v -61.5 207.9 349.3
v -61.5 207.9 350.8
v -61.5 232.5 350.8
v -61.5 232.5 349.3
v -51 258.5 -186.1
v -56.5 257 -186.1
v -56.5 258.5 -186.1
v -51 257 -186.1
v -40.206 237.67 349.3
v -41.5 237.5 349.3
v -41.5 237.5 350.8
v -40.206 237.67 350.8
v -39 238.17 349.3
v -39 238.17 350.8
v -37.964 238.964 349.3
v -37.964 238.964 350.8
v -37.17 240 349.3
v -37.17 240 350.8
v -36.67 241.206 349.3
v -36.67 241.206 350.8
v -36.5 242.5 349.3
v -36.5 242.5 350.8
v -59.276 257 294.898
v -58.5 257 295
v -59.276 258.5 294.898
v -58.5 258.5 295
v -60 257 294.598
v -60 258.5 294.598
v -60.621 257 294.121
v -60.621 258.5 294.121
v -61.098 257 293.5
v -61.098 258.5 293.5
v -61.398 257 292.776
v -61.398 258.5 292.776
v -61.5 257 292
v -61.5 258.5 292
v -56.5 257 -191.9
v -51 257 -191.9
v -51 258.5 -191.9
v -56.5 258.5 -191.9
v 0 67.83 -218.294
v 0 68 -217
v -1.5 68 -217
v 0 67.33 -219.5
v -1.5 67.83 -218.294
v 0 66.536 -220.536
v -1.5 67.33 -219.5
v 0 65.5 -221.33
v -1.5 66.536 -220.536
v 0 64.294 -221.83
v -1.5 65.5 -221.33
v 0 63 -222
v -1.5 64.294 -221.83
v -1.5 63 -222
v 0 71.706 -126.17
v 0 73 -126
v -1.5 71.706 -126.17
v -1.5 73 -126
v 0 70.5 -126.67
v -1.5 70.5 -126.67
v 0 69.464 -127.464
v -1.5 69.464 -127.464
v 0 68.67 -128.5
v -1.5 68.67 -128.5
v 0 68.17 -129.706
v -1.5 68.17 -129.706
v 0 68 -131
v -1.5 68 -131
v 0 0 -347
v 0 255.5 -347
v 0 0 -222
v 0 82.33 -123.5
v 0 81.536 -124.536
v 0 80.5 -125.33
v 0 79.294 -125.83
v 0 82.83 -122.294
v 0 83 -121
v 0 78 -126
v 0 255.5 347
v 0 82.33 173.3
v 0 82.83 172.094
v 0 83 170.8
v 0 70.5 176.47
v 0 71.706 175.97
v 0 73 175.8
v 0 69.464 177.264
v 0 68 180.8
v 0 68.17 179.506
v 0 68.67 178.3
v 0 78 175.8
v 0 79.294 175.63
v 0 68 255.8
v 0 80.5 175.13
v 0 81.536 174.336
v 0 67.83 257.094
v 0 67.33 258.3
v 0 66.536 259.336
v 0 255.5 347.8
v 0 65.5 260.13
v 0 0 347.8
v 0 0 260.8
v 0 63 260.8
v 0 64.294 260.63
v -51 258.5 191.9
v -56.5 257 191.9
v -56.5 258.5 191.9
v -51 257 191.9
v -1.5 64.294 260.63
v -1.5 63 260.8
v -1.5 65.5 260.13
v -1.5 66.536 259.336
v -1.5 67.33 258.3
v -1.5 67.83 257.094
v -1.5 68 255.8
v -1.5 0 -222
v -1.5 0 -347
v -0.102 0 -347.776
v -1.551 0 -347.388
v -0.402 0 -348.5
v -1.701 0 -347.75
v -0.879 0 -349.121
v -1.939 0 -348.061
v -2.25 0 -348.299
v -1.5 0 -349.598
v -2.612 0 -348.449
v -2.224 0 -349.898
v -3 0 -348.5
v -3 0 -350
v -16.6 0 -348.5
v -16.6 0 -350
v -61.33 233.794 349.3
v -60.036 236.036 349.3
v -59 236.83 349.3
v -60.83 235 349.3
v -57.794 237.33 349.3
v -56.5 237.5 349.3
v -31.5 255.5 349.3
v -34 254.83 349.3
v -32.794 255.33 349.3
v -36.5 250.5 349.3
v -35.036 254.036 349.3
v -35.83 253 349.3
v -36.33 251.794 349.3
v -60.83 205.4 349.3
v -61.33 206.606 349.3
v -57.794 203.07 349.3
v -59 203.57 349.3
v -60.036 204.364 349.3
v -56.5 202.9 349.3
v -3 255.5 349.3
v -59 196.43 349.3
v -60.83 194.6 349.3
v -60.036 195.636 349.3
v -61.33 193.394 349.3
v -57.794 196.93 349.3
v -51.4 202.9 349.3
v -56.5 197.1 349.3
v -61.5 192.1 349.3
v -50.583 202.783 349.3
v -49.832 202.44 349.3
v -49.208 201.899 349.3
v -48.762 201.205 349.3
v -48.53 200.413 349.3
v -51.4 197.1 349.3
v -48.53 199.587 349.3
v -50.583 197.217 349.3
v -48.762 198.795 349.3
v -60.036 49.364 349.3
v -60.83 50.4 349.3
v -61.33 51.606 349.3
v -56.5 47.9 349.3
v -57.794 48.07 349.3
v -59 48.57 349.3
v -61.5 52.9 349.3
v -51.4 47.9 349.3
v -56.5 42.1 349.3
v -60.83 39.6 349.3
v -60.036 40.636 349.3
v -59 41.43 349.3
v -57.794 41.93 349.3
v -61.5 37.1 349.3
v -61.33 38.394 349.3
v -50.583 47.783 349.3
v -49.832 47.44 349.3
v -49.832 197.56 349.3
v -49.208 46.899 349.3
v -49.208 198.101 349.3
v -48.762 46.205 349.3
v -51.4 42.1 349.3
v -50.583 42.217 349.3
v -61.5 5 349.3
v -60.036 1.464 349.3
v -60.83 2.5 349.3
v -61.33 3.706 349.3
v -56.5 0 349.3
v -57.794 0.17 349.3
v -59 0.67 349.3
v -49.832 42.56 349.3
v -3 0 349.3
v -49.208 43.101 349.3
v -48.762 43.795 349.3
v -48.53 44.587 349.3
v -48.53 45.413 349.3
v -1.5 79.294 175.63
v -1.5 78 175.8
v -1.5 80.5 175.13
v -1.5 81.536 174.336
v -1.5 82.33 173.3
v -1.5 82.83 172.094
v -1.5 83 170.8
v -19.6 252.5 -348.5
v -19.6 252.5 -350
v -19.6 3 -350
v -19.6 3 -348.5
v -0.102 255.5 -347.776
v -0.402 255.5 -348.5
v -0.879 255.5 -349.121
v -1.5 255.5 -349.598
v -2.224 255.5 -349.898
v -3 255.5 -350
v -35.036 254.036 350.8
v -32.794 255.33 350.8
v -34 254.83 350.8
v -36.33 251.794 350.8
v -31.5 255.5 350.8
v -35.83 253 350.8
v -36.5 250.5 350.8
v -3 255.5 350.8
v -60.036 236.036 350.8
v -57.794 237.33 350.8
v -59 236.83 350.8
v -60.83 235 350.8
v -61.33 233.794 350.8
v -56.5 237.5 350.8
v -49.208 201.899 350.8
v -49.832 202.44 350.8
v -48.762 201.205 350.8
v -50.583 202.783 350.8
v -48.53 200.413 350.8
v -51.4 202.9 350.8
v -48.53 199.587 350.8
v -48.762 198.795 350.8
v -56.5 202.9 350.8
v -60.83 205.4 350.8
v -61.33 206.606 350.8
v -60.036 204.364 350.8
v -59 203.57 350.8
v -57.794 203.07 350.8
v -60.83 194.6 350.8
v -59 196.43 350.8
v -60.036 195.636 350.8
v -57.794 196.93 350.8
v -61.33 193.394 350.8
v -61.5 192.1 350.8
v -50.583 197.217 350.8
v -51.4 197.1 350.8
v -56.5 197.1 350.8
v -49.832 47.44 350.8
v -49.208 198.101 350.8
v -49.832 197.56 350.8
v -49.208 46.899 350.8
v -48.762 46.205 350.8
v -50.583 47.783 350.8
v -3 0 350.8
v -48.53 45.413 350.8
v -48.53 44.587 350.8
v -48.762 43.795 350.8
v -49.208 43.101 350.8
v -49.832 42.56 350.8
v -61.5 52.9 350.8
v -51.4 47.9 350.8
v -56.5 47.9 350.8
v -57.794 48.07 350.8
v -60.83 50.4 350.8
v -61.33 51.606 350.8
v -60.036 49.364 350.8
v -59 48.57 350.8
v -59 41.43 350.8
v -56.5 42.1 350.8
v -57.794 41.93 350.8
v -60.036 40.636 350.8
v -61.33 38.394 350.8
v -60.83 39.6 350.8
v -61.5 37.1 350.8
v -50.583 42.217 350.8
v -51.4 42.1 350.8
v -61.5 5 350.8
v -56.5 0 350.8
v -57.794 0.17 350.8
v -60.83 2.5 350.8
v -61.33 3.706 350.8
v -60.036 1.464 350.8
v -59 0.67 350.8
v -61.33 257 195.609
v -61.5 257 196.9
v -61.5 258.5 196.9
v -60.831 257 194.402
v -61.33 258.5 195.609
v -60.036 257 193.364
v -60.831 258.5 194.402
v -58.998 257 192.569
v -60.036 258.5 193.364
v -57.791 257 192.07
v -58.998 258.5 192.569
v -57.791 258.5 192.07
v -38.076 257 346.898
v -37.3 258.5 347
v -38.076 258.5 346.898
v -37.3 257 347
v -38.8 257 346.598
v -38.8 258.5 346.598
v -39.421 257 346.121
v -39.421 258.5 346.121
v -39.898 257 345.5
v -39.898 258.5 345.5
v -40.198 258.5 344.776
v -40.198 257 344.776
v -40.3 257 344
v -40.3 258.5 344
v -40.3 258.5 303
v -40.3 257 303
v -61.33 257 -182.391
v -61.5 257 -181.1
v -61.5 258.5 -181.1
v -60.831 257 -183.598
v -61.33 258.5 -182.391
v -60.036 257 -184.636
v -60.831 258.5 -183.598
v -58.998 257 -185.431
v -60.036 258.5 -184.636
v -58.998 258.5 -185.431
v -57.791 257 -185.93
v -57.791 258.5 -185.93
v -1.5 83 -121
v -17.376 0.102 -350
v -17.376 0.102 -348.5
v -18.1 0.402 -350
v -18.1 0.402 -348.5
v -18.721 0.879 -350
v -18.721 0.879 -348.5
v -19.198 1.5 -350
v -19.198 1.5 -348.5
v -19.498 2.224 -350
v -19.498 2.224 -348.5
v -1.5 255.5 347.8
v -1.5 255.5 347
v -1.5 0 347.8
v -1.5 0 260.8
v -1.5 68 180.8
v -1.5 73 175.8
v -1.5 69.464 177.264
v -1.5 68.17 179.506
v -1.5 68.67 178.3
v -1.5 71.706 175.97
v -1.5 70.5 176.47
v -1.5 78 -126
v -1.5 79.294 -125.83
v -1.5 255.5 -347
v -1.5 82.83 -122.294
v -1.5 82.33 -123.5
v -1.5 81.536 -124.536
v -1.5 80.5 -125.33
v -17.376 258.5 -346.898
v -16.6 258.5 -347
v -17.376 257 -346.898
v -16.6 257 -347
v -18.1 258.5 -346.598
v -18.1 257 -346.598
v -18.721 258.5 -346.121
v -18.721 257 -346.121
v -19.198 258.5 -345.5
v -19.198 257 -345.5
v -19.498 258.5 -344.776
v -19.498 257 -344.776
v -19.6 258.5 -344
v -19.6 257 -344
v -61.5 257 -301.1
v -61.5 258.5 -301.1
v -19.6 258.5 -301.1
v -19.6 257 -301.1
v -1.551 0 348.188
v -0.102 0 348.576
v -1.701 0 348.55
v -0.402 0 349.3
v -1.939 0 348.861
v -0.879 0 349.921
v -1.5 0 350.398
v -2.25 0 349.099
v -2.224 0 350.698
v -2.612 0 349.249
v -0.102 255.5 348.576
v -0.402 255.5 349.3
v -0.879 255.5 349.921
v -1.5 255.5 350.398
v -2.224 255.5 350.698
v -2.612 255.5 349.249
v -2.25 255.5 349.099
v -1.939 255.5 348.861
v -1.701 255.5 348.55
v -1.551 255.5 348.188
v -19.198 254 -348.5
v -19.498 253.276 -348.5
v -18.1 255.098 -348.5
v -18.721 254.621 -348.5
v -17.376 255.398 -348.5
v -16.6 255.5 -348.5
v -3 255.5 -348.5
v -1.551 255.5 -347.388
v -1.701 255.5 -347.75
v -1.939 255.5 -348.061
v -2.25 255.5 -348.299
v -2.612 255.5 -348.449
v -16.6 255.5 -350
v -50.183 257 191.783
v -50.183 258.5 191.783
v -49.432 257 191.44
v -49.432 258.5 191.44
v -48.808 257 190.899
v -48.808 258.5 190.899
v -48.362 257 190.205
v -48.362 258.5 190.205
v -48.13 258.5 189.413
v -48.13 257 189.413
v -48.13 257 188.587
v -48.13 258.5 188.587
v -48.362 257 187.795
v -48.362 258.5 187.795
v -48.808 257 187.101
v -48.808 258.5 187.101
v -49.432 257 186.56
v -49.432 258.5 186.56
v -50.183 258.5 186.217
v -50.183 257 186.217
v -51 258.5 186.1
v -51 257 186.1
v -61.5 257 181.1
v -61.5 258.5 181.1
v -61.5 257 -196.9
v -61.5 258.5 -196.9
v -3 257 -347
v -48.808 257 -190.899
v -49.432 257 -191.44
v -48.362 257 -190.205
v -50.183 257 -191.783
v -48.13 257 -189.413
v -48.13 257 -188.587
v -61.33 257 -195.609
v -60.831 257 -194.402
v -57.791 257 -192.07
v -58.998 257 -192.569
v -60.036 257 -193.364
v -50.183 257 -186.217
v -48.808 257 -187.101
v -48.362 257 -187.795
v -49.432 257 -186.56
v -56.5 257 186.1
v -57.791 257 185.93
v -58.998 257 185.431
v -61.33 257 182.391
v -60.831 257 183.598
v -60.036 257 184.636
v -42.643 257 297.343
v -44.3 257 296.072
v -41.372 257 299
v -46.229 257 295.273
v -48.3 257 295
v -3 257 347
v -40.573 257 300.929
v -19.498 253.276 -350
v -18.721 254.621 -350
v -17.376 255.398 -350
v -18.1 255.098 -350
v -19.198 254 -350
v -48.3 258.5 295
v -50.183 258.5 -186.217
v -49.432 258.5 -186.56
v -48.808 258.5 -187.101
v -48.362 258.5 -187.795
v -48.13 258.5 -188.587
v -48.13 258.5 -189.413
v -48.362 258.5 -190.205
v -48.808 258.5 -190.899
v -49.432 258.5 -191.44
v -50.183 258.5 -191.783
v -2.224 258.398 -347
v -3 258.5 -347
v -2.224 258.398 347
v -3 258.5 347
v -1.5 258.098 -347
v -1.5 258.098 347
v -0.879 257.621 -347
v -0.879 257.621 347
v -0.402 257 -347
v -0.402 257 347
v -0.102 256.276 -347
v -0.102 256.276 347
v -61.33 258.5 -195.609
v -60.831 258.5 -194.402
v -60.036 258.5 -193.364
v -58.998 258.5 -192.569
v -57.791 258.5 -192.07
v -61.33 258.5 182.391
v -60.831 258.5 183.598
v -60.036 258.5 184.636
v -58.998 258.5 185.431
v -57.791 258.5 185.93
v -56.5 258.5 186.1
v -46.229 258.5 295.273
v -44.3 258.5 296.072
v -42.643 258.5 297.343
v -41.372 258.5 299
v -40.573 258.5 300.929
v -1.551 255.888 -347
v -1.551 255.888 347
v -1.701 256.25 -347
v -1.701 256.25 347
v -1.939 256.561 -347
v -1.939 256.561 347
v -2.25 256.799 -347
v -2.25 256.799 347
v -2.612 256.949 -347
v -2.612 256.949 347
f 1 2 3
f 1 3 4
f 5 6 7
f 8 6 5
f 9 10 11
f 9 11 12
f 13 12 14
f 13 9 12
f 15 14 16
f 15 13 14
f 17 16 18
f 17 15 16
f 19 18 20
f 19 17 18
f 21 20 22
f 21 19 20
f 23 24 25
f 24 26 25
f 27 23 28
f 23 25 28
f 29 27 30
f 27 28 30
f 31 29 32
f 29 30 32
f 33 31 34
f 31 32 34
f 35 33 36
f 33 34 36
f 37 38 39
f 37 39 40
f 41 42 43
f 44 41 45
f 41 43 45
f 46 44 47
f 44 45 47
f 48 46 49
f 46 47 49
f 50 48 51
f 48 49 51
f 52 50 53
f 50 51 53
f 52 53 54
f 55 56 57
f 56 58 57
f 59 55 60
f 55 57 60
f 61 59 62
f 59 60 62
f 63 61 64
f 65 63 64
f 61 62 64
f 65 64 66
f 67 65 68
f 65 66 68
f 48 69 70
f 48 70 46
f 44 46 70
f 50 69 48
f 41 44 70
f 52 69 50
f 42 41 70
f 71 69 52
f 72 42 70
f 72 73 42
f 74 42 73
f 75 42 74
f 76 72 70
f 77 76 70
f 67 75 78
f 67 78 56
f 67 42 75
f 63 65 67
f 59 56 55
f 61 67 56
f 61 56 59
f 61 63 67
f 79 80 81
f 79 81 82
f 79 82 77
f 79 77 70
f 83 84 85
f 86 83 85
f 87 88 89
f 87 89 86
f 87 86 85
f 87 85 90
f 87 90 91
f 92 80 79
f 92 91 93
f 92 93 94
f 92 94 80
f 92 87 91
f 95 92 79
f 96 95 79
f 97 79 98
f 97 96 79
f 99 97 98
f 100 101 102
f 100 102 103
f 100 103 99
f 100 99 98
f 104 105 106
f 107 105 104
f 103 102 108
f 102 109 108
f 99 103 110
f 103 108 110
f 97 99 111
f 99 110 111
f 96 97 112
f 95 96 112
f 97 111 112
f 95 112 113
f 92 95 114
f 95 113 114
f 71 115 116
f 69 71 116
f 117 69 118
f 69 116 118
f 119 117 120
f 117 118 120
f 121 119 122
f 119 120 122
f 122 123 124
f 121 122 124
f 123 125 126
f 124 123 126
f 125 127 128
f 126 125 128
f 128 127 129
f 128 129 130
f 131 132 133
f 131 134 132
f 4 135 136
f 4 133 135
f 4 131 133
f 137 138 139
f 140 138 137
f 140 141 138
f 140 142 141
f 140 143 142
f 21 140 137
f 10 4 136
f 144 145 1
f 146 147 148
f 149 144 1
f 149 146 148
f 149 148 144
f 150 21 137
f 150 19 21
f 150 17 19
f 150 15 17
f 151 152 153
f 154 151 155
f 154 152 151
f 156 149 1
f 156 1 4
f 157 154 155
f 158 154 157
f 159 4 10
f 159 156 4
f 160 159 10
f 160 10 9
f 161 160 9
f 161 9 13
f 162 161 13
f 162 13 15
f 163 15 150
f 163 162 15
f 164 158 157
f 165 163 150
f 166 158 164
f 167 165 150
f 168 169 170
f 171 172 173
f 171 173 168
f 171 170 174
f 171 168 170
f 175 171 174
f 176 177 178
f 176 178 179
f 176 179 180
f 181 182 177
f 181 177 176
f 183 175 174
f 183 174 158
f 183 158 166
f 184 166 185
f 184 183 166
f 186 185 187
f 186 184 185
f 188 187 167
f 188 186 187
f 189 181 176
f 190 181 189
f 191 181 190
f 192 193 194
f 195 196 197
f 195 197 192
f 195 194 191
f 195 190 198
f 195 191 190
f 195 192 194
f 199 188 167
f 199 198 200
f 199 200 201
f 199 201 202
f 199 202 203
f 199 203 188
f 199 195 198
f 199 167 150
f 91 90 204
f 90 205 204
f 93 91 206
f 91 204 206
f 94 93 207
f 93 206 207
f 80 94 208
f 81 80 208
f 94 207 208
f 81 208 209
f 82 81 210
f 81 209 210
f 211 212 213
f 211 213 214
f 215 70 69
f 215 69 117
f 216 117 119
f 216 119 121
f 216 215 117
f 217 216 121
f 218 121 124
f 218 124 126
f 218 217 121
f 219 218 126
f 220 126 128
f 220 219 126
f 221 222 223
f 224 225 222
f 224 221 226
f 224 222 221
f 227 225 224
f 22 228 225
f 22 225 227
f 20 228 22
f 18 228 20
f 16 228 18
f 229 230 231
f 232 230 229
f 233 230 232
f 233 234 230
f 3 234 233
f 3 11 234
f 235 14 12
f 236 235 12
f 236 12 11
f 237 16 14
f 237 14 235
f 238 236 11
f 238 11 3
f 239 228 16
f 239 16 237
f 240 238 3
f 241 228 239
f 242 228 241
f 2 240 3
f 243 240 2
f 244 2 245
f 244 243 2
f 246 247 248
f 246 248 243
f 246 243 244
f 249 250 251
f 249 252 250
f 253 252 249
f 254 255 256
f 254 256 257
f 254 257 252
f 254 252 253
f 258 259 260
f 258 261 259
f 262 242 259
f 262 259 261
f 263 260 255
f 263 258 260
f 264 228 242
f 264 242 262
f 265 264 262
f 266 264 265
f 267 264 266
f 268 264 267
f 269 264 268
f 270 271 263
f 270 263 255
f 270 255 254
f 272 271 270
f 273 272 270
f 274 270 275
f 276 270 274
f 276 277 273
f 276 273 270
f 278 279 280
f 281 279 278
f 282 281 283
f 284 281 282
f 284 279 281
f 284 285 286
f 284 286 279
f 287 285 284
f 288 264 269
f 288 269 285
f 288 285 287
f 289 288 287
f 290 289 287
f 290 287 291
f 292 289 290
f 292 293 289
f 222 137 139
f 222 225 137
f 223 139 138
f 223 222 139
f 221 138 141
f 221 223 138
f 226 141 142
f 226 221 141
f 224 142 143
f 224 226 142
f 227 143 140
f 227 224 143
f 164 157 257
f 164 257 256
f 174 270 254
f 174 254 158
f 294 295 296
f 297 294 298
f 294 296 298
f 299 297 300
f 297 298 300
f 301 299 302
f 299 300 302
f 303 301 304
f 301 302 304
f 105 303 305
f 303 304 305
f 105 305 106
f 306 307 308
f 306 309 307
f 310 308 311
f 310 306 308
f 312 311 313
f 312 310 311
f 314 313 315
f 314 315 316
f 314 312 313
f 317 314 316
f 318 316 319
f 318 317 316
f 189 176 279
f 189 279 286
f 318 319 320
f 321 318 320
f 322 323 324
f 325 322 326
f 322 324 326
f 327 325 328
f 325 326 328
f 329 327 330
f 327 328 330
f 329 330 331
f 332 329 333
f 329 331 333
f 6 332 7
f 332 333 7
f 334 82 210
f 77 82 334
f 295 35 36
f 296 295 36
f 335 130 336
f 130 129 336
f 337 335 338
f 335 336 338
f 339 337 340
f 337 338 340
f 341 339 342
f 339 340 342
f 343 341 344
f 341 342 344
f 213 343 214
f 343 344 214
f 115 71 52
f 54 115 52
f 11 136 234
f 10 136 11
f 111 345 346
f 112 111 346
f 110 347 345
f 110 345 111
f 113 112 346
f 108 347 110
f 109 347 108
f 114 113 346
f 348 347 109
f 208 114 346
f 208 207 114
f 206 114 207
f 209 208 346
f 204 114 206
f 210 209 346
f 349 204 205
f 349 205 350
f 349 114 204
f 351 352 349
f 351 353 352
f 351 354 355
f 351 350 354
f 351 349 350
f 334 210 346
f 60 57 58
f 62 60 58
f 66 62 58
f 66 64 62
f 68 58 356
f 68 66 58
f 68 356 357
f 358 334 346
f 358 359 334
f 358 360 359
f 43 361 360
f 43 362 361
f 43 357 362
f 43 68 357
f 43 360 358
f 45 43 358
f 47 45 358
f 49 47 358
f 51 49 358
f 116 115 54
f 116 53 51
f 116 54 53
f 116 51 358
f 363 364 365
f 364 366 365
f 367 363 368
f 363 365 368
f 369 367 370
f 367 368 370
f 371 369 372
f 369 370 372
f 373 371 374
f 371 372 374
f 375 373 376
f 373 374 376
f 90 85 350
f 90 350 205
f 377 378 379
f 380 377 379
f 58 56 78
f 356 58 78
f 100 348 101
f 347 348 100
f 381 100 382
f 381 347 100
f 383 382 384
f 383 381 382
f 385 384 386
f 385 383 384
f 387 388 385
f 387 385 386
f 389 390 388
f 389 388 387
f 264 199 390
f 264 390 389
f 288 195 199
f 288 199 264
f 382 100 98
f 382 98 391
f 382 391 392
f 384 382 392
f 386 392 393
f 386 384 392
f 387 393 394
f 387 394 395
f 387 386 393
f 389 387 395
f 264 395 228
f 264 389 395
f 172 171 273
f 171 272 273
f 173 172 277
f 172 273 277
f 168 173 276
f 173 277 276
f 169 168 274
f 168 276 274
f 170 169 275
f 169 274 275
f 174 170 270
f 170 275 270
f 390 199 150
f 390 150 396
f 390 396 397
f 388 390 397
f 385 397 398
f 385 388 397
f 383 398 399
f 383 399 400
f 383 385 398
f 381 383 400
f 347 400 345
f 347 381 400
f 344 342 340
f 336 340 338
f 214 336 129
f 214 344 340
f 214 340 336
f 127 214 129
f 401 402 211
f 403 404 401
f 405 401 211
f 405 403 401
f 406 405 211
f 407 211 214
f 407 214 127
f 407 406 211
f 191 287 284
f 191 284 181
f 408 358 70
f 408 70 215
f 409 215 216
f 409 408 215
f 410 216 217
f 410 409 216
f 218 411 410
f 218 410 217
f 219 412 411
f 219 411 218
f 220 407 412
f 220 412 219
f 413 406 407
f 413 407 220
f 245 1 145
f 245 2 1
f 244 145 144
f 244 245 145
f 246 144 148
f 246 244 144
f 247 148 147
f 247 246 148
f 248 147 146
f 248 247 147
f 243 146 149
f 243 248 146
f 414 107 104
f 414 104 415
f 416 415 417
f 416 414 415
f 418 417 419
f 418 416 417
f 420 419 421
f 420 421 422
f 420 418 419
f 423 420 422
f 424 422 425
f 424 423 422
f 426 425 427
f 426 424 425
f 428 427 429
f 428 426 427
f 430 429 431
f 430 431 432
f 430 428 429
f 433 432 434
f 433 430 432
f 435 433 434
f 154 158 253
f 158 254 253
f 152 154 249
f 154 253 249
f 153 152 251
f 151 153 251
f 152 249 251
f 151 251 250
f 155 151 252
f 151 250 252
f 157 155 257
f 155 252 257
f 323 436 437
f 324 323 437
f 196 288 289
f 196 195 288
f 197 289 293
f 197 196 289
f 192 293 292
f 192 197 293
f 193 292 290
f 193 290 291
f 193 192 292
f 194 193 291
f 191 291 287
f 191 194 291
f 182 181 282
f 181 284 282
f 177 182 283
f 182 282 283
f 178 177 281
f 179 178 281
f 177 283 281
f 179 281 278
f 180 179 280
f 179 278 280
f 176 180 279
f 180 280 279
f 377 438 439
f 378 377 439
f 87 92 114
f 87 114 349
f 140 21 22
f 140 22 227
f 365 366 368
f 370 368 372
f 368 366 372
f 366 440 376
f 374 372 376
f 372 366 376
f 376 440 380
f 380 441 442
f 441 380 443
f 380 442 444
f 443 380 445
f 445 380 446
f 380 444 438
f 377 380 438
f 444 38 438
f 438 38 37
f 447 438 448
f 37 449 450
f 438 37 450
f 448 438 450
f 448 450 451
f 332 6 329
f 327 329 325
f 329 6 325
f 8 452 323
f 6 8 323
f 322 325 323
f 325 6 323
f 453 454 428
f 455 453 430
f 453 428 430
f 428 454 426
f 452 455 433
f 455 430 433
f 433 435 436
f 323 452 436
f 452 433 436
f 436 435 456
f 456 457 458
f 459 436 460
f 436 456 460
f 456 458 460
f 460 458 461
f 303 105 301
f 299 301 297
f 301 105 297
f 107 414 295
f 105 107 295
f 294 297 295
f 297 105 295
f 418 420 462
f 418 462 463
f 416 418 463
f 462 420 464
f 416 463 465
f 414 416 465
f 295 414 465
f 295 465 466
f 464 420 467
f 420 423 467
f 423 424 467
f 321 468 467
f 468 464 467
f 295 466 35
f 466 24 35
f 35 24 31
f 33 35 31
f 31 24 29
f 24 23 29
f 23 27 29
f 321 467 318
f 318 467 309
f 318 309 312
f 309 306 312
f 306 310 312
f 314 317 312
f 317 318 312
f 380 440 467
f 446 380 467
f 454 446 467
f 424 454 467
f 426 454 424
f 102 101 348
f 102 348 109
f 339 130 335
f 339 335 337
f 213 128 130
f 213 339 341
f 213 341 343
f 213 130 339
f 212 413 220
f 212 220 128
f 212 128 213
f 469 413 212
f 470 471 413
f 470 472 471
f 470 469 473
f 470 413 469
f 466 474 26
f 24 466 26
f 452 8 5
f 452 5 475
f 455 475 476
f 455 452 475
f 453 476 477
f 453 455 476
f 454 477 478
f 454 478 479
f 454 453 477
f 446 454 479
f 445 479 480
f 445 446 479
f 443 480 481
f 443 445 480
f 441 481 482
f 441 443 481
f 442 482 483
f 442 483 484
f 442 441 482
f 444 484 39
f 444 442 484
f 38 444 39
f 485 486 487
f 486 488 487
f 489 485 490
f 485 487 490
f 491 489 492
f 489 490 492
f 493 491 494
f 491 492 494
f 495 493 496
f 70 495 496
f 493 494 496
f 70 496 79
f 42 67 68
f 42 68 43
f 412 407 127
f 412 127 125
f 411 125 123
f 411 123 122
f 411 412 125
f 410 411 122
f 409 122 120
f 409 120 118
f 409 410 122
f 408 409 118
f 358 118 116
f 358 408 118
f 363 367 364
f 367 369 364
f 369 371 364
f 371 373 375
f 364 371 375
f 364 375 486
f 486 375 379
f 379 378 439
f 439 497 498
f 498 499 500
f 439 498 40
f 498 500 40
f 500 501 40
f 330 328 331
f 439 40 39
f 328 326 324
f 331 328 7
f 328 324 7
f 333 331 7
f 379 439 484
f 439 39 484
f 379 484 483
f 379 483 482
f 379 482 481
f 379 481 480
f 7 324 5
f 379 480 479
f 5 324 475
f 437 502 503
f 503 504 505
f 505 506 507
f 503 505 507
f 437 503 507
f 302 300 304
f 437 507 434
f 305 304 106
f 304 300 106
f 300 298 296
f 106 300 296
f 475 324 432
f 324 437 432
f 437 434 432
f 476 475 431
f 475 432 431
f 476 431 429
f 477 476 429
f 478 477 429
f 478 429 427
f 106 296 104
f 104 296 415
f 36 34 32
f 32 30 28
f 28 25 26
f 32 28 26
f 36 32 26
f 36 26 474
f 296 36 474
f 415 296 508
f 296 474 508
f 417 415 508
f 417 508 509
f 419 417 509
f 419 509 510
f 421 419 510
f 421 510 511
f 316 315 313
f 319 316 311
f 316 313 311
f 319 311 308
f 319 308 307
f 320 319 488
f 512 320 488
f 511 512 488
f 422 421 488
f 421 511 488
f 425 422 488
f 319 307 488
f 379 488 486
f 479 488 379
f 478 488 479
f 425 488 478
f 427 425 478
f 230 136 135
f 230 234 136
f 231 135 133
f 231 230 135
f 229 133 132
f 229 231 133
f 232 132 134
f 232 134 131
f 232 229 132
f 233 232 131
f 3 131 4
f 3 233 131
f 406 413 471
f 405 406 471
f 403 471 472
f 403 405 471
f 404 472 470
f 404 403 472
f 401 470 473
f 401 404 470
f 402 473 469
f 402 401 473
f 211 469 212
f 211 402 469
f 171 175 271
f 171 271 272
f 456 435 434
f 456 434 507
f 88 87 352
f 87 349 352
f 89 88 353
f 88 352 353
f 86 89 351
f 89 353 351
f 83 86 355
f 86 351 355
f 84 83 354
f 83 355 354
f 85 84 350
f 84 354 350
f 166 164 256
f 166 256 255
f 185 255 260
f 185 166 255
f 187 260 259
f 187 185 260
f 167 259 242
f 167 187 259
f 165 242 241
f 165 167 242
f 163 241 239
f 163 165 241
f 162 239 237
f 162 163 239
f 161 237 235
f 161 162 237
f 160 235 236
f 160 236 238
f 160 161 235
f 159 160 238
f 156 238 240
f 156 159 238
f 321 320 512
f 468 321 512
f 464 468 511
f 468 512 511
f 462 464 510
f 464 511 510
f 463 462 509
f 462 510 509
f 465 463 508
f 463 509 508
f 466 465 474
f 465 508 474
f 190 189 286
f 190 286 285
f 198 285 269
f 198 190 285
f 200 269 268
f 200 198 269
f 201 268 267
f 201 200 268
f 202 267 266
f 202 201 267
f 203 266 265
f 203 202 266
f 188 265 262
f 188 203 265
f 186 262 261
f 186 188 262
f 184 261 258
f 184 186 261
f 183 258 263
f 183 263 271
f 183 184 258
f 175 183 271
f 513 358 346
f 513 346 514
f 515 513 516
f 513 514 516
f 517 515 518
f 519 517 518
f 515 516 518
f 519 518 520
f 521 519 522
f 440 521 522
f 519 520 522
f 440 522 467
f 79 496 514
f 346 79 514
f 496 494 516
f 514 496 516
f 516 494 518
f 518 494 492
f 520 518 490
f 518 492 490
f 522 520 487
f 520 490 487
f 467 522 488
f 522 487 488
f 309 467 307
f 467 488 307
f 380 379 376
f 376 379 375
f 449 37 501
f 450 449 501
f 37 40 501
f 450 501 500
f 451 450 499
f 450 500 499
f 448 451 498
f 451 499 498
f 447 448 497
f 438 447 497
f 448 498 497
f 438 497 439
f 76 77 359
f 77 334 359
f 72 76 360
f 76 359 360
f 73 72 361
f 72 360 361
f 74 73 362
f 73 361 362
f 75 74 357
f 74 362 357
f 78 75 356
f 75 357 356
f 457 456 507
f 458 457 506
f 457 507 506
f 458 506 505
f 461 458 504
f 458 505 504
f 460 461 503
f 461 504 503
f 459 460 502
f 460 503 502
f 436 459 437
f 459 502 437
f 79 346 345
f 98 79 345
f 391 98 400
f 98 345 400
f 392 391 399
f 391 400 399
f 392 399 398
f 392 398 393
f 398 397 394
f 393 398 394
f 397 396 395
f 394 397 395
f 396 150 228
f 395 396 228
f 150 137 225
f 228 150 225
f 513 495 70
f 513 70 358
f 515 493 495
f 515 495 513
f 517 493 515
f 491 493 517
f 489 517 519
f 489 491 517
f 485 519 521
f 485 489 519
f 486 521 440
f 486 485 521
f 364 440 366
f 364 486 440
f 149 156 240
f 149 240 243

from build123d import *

# Parameters (mm, degrees)
BASE_FLANGE1_DEPTH       = 347
EDGE_FLANGE1_DEPTH       = 255.5
SKETCH5_W                = 301.8
SKETCH5_H                = 83
CUT_EXTRUDE1_DEPTH       = 10
SKETCH6_W                = 41.9
SKETCH6_H                = 45.9
CUT_EXTRUDE2_DEPTH       = 1.5
CUT_EXTRUDE3_DEPTH       = 1.5
EDGE_FLANGE2_DEPTH       = 255.5
M5_START                 = 349.3
M5_CLEARANCE_SLOT1_DEPTH = 1.5
FILLET1_R                = 5
M5_START_2               = 257
M5_CLEARANCE_SLOT2_DEPTH = 1.5
FILLET2_R                = 5
FILLET3_R                = 3
SKETCH15_W               = 96
SKETCH15_H               = 68
CUT_EXTRUDE4_DEPTH       = 10
SKETCH16_W               = 85
SKETCH16_H               = 68
CUT_EXTRUDE5_DEPTH       = 1.5
FILLET4_R                = 5
FILLET5_R                = 3
CUT_EXTRUDE6_DEPTH       = 750.483248688
CUT_EXTRUDE6_DEPTH_BACK  = 4
FILLET6_R                = 5


# Read off the part's stored shape, not the designer's step: M5 Clearance Slot1, M5 Clearance Slot2
# Sheet-metal steps are written as plain solids
with BuildPart() as part:
    # Sketch1 → Base-Flange1 (new, symmetric)
    with BuildSketch(Plane.XY):
        with BuildLine():
            Line((-61.5, 258.5), (-3, 258.5))
            ThreePointArc((-3, 258.5), (-0.878679656, 257.621320344), (0, 255.5))
            Line((0, 255.5), (0, 0))
            Line((0, 0), (-1.5, 0))
            Line((-1.5, 0), (-1.5, 255.5))
            ThreePointArc((-1.5, 255.5), (-1.939339828, 256.560660172), (-3, 257))
            Line((-3, 257), (-61.5, 257))
            Line((-61.5, 257), (-61.5, 258.5))
        make_face()
    extrude(amount=BASE_FLANGE1_DEPTH, both=True)

    # Edge-Flange1 section (across the edge) → Edge-Flange1 (add)
    with BuildSketch(Plane(origin=(-1.5, 0, 349.3), x_dir=(0, 0, -1), z_dir=(0, 1, 0))):
        with BuildLine():
            Line((-1.5, 1.5), (-1.5, 60))
            Line((-1.5, 60), (0, 60))
            Line((0, 60), (0, 1.5))
            ThreePointArc((0, 1.5), (0.439339828, 0.439339828), (1.5, 0))
            Line((1.5, 0), (2.3, 0))
            Line((2.3, 0), (2.3, -1.5))
            Line((2.3, -1.5), (1.5, -1.5))
            ThreePointArc((1.5, -1.5), (-0.621320344, -0.621320344), (-1.5, 1.5))
        make_face()
    extrude(amount=EDGE_FLANGE1_DEPTH)

    # Sketch5 → Cut-Extrude1 (cut)
    with BuildSketch(Plane(origin=(0, 0, 0), x_dir=(0, 0, -1), z_dir=(1, 0, 0))):
        with Locations((-24.9, 41.5)):
            Rectangle(SKETCH5_W, SKETCH5_H)
    extrude(amount=-CUT_EXTRUDE1_DEPTH, mode=Mode.SUBTRACT)

    # Sketch6 → Cut-Extrude2 (cut)
    with BuildSketch(Plane(origin=(0, 258.5, 0), x_dir=(1, 0, 0), z_dir=(0, 1, 0))):
        with Locations((-40.55, 324.05)):
            Rectangle(SKETCH6_W, SKETCH6_H)
    extrude(amount=-CUT_EXTRUDE2_DEPTH, mode=Mode.SUBTRACT)

    # Sketch7 → Cut-Extrude3 (cut)
    with BuildSketch(Plane(origin=(0, 258.5, 0), x_dir=(1, 0, 0), z_dir=(0, 1, 0))):
        with BuildLine():
            Line((-40.3, -335), (-40.3, -303))
            ThreePointArc((-40.3, -303), (-42.643145751, -297.343145751), (-48.3, -295))
            Line((-48.3, -295), (-71.165008453, -295))
            Line((-71.165008453, -295), (-71.165008453, -343))
            Line((-71.165008453, -343), (-71.165008453, -364.064767585))
            Line((-71.165008453, -364.064767585), (-40.3, -364.064767585))
            Line((-40.3, -364.064767585), (-40.3, -335))
        make_face()
    extrude(amount=-CUT_EXTRUDE3_DEPTH, mode=Mode.SUBTRACT)

    # Edge-Flange2 section (across the edge) → Edge-Flange2 (add)
    with BuildSketch(Plane(origin=(-1.5, 255.5, -348.5), x_dir=(0, 0, 1), z_dir=(0, -1, 0))):
        with BuildLine():
            Line((-1.5, 1.5), (-1.5, 18.1))
            Line((-1.5, 18.1), (0, 18.1))
            Line((0, 18.1), (0, 1.5))
            ThreePointArc((0, 1.5), (0.439339828, 0.439339828), (1.5, 0))
            Line((1.5, 0), (1.5, -1.5))
            ThreePointArc((1.5, -1.5), (-0.621320344, -0.621320344), (-1.5, 1.5))
        make_face()
    extrude(amount=EDGE_FLANGE2_DEPTH)

    # M5 Clearance Slot1 outline → M5 Clearance Slot1 (cut)
    with BuildSketch(Plane.XY.offset(M5_START)):
        with BuildLine():
            Line((-61.5, 42.1), (-51.4, 42.1))
            ThreePointArc((-51.4, 42.1), (-48.5, 45), (-51.4, 47.9))
            Line((-51.4, 47.9), (-61.5, 47.9))
            Line((-61.5, 47.9), (-61.5, 42.1))
        make_face()
        with BuildLine():
            Line((-61.5, 202.9), (-61.5, 197.1))
            Line((-61.5, 197.1), (-51.4, 197.1))
            ThreePointArc((-51.4, 197.1), (-48.5, 200), (-51.4, 202.9))
            Line((-51.4, 202.9), (-61.5, 202.9))
        make_face()
    extrude(amount=M5_CLEARANCE_SLOT1_DEPTH, mode=Mode.SUBTRACT)

    # Fillet1
    fillet1_edges = [part.edges().sort_by_distance(p)[0] for p in [
        (-61.5, 42.1, 350.05),
        (-61.5, 47.9, 350.05),
        (-61.5, 197.1, 350.05),
        (-61.5, 202.9, 350.05),
        (-61.5, 0, 350.05),
        (-61.5, 255.5, 350.05),
    ]]
    fillet(fillet1_edges, radius=FILLET1_R)

    # M5 Clearance Slot2 outline → M5 Clearance Slot2 (cut)
    with BuildSketch(Plane(origin=(0, 0, 0), x_dir=(1, 0, 0), z_dir=(0, 1, 0)).offset(M5_START_2)):
        with BuildLine():
            Line((-51, 191.9), (-61.2, 191.9))
            ThreePointArc((-61.2, 191.9), (-61.350201599, 191.896107643), (-61.5, 191.88444102))
            Line((-61.5, 191.88444102), (-61.5, 186.11555898))
            ThreePointArc((-61.5, 186.11555898), (-61.350201599, 186.103892357), (-61.2, 186.1))
            Line((-61.2, 186.1), (-51, 186.1))
            ThreePointArc((-51, 186.1), (-48.1, 189), (-51, 191.9))
        make_face()
        with BuildLine():
            ThreePointArc((-61.2, -186.1), (-61.350201599, -186.103892357), (-61.5, -186.11555898))
            Line((-61.5, -186.11555898), (-61.5, -191.88444102))
            ThreePointArc((-61.5, -191.88444102), (-61.350201599, -191.896107643), (-61.2, -191.9))
            Line((-61.2, -191.9), (-51, -191.9))
            ThreePointArc((-51, -191.9), (-48.1, -189), (-51, -186.1))
            Line((-51, -186.1), (-61.2, -186.1))
        make_face()
    extrude(amount=M5_CLEARANCE_SLOT2_DEPTH, mode=Mode.SUBTRACT)

    # Fillet2
    fillet2_edges = [part.edges().sort_by_distance(p)[0] for p in [
        (-61.5, 257.75, 186.11555898),
        (-61.5, 257.75, 191.88444102),
        (-61.5, 257.75, -191.88444102),
        (-61.5, 257.75, -186.11555898),
    ]]
    fillet(fillet2_edges, radius=FILLET2_R)

    # Fillet3
    fillet3_edges = [part.edges().sort_by_distance(p)[0] for p in [
        (-19.6, 255.5, -349.25),
        (-19.6, 0, -349.25),
        (-19.6, 257.75, -347),
    ]]
    fillet(fillet3_edges, radius=FILLET3_R)

    # Sketch15 → Cut-Extrude4 (cut)
    with BuildSketch(Plane(origin=(0, 0, 0), x_dir=(0, 0, -1), z_dir=(1, 0, 0))):
        with Locations((174, 34)):
            Rectangle(SKETCH15_W, SKETCH15_H)
    extrude(amount=-CUT_EXTRUDE4_DEPTH, mode=Mode.SUBTRACT)

    # Sketch16 → Cut-Extrude5 (cut)
    with BuildSketch(Plane(origin=(0, 0, 0), x_dir=(0, 0, -1), z_dir=(1, 0, 0))):
        with Locations((-218.3, 34)):
            Rectangle(SKETCH16_W, SKETCH16_H)
    extrude(amount=-CUT_EXTRUDE5_DEPTH, mode=Mode.SUBTRACT)

    # Fillet4
    fillet4_edges = [part.edges().sort_by_distance(p)[0] for p in [
        (-0.75, 68, -126),
        (-0.75, 68, -222),
        (-0.75, 68, 175.8),
        (-0.75, 68, 260.8),
        (-0.75, 83, 175.8),
        (-0.75, 83, -126),
    ]]
    fillet(fillet4_edges, radius=FILLET4_R)

    # Fillet5
    fillet5_edges = [part.edges().sort_by_distance(p)[0] for p in [
        (-40.3, 257.75, 347),
        (-61.5, 257.75, 295),
    ]]
    fillet(fillet5_edges, radius=FILLET5_R)

    # Sketch17 → Cut-Extrude6 (cut, two sides: drawn at the far end of the back side and taken through both)
    with BuildSketch(Plane.XY.offset(350.8).offset(-CUT_EXTRUDE6_DEPTH_BACK)):
        with BuildLine():
            Line((-61.5, 250.5), (-61.5, 237.5))
            Line((-61.5, 237.5), (-41.5, 237.5))
            ThreePointArc((-41.5, 237.5), (-37.964466094, 238.964466094), (-36.5, 242.5))
            Line((-36.5, 242.5), (-36.5, 255.5))
            Line((-36.5, 255.5), (-56.5, 255.5))
            ThreePointArc((-56.5, 255.5), (-60.035533906, 254.035533906), (-61.5, 250.5))
        make_face()
    extrude(amount=CUT_EXTRUDE6_DEPTH + CUT_EXTRUDE6_DEPTH_BACK, mode=Mode.SUBTRACT)

    # Fillet6
    fillet6_edges = [part.edges().sort_by_distance(p)[0] for p in [
        (-61.5, 237.5, 350.05),
        (-36.5, 255.5, 350.05),
    ]]
    fillet(fillet6_edges, radius=FILLET6_R)


solid = part.part
